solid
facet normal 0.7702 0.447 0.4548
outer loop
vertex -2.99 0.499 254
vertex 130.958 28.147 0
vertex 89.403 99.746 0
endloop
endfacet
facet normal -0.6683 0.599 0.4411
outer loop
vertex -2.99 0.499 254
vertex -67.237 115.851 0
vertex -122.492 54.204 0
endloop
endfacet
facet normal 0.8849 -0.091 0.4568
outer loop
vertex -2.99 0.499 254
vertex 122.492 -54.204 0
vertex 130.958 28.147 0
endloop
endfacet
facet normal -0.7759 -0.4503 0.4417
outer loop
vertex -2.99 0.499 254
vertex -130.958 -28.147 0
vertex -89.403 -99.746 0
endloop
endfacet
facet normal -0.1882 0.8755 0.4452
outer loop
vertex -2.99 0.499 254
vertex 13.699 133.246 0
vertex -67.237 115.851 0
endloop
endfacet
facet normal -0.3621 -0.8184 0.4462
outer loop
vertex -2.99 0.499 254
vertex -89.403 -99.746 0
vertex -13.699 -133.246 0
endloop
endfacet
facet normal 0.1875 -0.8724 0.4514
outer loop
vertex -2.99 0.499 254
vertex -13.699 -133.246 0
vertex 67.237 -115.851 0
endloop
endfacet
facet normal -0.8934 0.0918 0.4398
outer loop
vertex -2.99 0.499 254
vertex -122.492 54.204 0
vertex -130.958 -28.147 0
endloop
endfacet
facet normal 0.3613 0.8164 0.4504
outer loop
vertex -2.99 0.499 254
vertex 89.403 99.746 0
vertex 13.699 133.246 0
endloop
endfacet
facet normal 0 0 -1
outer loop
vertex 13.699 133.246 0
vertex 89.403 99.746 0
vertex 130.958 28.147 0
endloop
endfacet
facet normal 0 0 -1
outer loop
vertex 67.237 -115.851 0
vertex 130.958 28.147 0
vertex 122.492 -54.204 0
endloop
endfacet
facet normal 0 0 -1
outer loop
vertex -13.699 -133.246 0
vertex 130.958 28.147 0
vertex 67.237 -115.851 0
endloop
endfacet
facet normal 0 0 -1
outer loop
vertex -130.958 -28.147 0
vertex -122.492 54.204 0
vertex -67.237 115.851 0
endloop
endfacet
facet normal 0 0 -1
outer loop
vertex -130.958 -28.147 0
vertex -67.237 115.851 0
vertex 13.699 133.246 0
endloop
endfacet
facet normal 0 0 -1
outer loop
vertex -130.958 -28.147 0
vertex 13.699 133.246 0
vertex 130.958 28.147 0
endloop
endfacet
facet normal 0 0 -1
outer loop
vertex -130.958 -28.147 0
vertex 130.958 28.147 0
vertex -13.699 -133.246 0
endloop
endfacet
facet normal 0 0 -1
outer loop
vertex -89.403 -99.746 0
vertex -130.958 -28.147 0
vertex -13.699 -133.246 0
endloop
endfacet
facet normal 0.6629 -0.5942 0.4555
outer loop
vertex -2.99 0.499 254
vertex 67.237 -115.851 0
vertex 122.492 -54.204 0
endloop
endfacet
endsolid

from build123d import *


with BuildPart() as f3:
    # F0 (on Top) → F3 section 0
    with BuildSketch(Plane.XY, mode=Mode.PRIVATE) as f3_s0:
        Polygon((13.699032, 133.246349), (-67.237489, 115.85065), (-122.491575, 54.20394), (-130.958042, -28.146832), (-89.402989, -99.746472), (-13.699032, -133.246349), (67.237489, -115.85065), (122.491575, -54.20394), (130.958042, 28.146832), (89.402989, 99.746472), align=None)
    loft([Vertex(-2.990126, 0.499404, 254), f3_s0.sketch])


solid = f3.part
